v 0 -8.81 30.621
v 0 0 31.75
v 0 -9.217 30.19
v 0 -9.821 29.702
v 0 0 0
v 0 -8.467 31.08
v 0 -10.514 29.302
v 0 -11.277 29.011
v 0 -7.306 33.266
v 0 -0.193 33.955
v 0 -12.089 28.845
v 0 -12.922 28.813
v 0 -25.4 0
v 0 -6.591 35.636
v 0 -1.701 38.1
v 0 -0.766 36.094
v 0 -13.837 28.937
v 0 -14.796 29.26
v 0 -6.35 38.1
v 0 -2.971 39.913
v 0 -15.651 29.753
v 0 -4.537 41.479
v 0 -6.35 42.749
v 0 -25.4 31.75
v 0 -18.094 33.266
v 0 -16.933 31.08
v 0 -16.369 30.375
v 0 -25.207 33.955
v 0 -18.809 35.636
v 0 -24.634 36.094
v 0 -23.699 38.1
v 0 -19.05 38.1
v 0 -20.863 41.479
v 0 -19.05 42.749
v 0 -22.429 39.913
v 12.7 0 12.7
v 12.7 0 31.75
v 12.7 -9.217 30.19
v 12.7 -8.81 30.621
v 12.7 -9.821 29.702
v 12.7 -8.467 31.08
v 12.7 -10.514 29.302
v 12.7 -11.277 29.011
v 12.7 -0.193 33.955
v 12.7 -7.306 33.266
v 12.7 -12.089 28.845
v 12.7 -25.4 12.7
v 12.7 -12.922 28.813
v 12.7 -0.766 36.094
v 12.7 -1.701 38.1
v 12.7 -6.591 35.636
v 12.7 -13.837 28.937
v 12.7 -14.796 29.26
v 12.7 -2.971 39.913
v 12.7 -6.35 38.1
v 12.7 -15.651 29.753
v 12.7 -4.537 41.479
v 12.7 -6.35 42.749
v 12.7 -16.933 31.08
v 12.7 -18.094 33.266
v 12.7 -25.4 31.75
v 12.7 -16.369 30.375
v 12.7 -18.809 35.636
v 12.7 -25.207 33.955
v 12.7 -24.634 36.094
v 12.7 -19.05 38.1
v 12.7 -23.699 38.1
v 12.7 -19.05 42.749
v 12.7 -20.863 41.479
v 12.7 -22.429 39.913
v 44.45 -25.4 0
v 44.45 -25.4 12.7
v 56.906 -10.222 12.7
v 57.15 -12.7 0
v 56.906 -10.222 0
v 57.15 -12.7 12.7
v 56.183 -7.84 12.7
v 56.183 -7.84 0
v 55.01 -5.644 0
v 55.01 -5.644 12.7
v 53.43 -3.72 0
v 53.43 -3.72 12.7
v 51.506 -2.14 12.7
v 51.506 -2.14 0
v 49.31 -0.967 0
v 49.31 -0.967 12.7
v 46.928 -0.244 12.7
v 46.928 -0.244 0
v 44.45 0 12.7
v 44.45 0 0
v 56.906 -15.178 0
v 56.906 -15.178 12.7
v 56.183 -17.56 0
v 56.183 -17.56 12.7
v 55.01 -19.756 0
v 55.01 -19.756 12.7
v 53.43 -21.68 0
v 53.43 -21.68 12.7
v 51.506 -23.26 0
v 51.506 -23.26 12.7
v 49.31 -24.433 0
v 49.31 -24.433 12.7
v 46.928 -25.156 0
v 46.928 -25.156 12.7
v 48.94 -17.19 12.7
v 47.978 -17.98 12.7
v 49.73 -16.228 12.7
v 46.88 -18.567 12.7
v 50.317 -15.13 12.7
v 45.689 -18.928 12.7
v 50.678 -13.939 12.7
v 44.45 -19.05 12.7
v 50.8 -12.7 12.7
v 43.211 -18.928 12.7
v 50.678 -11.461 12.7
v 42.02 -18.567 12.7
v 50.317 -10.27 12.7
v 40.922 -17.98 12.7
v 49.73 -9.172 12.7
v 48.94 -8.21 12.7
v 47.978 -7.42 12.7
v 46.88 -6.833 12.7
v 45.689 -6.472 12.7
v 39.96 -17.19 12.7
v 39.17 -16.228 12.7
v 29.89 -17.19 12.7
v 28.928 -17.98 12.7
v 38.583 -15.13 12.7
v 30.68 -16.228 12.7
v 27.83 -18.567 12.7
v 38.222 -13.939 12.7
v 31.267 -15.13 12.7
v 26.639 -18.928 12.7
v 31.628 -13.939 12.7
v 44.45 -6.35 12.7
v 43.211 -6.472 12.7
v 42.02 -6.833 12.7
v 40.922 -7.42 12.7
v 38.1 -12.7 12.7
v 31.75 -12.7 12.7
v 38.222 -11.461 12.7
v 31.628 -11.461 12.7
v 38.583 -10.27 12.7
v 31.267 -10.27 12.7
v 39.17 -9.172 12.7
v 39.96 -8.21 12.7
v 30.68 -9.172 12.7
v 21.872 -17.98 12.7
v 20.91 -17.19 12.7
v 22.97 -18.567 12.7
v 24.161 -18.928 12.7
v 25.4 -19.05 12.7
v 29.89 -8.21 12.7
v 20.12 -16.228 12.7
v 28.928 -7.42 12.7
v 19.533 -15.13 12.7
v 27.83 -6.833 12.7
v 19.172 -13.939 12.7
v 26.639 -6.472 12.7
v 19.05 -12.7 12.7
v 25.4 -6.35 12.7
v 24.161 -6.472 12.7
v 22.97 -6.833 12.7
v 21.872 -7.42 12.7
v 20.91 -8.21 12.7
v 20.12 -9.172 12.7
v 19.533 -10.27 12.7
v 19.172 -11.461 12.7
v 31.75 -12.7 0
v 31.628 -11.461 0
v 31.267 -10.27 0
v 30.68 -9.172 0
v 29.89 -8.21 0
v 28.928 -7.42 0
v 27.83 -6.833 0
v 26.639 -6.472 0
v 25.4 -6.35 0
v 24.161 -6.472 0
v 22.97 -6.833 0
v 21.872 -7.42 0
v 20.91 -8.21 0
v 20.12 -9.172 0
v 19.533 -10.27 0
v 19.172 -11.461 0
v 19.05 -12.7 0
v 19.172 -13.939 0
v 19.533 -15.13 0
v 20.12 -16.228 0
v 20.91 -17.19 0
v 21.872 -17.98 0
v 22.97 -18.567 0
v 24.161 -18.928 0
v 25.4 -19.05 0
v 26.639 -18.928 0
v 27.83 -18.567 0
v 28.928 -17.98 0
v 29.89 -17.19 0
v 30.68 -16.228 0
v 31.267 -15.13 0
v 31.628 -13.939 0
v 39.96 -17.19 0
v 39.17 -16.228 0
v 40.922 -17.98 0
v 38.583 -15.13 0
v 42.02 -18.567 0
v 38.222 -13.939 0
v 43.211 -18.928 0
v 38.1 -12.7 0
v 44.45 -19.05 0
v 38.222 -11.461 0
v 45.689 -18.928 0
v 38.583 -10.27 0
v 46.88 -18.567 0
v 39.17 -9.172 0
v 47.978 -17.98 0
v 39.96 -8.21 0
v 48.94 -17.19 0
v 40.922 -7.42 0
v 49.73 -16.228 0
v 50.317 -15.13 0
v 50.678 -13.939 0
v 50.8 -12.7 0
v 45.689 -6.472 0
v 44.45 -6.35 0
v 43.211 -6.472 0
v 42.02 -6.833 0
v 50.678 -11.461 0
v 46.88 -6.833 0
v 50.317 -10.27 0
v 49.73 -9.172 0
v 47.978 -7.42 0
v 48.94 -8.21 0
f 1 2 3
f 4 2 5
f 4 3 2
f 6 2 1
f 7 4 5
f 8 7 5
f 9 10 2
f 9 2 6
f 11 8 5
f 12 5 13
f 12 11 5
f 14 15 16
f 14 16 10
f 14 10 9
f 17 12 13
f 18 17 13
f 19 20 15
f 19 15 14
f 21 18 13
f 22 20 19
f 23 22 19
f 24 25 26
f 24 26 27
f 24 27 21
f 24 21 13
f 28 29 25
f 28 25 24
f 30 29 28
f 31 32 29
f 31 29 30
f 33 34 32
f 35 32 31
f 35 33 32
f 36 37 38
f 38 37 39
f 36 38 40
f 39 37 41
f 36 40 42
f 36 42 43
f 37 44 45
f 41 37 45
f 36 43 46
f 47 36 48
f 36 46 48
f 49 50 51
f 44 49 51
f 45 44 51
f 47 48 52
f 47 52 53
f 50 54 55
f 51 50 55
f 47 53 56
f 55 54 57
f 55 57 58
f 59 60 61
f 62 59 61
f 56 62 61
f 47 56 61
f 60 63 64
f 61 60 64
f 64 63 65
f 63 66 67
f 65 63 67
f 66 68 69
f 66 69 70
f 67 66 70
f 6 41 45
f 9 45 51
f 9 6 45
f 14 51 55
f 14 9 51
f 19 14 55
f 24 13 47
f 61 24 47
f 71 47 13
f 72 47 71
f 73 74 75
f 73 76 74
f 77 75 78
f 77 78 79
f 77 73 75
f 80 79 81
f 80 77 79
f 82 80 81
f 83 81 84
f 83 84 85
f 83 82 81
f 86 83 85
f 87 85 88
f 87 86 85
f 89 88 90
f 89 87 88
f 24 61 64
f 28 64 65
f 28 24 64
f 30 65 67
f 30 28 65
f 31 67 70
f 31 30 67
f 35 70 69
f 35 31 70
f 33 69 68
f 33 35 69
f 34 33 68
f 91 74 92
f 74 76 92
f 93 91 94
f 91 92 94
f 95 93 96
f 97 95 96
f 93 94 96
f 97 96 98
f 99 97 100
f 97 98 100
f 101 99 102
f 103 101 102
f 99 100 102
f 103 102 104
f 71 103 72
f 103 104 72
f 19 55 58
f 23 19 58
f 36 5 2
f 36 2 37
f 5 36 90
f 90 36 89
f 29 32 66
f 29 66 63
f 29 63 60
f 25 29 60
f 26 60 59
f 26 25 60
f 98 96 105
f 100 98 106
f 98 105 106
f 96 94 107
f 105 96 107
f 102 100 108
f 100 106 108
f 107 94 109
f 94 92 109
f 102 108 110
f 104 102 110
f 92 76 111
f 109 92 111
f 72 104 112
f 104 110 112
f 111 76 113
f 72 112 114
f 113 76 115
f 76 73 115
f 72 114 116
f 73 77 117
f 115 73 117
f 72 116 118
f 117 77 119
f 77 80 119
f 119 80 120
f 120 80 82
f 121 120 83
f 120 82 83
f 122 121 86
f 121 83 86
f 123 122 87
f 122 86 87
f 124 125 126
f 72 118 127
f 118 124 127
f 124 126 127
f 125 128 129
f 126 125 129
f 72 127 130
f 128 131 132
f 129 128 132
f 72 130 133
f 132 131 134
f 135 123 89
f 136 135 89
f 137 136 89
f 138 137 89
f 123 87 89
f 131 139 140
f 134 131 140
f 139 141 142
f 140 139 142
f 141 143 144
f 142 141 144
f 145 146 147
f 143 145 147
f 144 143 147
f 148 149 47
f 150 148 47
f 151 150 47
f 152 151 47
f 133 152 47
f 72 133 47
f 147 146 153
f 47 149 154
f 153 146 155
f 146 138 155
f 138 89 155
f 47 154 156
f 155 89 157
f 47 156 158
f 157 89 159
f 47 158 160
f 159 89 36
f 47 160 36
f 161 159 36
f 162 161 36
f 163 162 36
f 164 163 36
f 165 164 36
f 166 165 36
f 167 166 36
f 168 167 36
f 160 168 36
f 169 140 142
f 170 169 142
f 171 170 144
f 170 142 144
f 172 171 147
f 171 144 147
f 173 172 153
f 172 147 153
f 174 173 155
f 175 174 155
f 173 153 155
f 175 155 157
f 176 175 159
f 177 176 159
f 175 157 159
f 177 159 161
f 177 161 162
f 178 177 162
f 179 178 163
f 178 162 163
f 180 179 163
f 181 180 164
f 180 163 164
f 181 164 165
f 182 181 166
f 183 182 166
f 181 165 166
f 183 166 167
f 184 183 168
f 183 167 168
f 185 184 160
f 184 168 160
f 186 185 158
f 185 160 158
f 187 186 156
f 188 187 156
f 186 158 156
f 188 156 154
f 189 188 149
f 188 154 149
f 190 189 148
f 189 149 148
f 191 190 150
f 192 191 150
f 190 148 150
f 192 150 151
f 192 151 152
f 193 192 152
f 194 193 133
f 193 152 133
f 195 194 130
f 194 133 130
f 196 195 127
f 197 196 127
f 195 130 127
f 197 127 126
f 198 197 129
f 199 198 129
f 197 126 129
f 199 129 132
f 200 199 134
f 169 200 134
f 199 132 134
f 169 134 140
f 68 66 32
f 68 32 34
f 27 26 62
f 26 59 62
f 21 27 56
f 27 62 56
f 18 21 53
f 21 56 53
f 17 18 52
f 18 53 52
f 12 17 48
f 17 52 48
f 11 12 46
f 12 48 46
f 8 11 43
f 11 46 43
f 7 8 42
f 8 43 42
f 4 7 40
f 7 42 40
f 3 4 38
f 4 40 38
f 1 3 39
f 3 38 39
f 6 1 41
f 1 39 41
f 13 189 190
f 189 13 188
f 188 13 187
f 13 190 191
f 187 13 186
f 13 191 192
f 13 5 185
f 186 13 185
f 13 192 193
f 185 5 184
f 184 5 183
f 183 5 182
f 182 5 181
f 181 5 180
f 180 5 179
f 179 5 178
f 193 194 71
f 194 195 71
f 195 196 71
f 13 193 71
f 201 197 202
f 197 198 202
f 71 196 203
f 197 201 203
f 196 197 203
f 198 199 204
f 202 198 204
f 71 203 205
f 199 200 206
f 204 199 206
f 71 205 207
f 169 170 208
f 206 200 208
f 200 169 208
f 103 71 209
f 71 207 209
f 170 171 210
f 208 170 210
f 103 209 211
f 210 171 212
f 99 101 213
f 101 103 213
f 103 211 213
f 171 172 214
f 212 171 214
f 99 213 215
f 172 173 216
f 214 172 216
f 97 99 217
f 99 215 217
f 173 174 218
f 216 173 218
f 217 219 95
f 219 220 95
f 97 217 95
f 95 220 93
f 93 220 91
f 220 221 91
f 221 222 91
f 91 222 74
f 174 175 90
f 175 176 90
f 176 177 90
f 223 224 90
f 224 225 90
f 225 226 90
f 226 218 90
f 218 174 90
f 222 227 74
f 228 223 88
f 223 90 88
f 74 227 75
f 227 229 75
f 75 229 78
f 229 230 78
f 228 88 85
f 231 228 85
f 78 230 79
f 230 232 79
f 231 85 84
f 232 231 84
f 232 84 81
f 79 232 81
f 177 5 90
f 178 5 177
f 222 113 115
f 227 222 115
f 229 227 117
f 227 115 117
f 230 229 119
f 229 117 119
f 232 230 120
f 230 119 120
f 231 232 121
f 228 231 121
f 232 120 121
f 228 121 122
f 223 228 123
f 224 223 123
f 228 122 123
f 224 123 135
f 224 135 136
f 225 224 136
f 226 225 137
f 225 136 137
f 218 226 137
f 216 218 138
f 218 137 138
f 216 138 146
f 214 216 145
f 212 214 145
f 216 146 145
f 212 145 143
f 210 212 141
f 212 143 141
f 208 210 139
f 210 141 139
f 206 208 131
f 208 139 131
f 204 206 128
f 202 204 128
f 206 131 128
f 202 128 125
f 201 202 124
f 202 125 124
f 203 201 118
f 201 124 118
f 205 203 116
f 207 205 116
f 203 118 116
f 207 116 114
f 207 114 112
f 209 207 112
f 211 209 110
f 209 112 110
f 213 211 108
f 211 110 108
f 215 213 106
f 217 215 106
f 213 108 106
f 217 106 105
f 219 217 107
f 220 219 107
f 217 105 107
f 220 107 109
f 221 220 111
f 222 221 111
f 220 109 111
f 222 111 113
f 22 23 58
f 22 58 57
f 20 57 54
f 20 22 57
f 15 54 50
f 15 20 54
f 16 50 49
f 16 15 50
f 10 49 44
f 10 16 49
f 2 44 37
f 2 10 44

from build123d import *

# Parameters (mm, degrees)
F1_DEPTH    = 25.4
F2_R        = 12.7
F3_R        = 12.69999
F4_R        = 12.7
F5_T1_DEPTH = 76.2
F6_W        = 12.7
F6_H        = 17.3485226281
F7_DEPTH    = 25.4
F9_T1_DEPTH = 12.7
F10_R       = 5.08
F11_R       = 6.35
F12_DEPTH   = 12.7


# Not quite as in the source:
# - a fillet or chamfer that OpenCascade refuses, or shapes differently, is made with other operations: its cross-section is extruded or revolved along the edge and cut away or added
# - a fillet or chamfer is up to 0.001 mm smaller than in the source, because OpenCascade refuses the exact size
# - a feature of the source that left no trace in its solid (it failed there, or was rolled back) is left out


with BuildPart() as f1:
    # F0 (on Front) → F1 (new body)
    with BuildSketch(Plane.XZ):
        Polygon((0, 44.45), (0, 0), (57.15, 0), (57.15, 12.7), (12.7, 12.7), (12.7, 44.45), align=None)
    extrude(amount=F1_DEPTH)

    # F2
    f2_edges = [f1.edges().sort_by_distance(p)[0] for p in [
        (57.15, -25.4, 6.35),
    ]]
    fillet(f2_edges, radius=F2_R)

    # F3 (radius 12.7 in the source; OpenCascade refuses exactly that, so slightly less here)
    f3_edges = [f1.edges().sort_by_distance(p)[0] for p in [
        (57.15, 0, 6.35),
    ]]
    fillet(f3_edges, radius=F3_R)

    # F4
    f4_edges = [f1.edges().sort_by_distance(p)[0] for p in [
        (6.35, -25.4, 44.45),
    ]]
    fillet(f4_edges, radius=F4_R)

    # F5: fillet of radius 12.7 on 1 edges, made by hand

    # F5_s2 → F5_t1 (cut)
    with BuildSketch(Plane.YZ.offset(-31.75)):
        with BuildLine():
            ThreePointArc((-12.7, 44.45), (-3.7197438789, 40.7302561211), (0, 31.75))
            Line((0, 31.75), (0, 44.45))
            Line((0, 44.45), (-12.7, 44.45))
        make_face()
    extrude(amount=F5_T1_DEPTH, mode=Mode.SUBTRACT)

    # F6 (on face) → F7 (cut)
    with BuildSketch(Plane.YZ.offset(12.7)):
        with BuildLine():
            ThreePointArc((-12.7, 44.45), (-15.9870018728, 44.0172579939), (-19.05, 42.7485226281))
            Line((-19.05, 42.7485226281), (-6.35, 42.7485226281))
            ThreePointArc((-6.35, 42.7485226281), (-9.4129981272, 44.0172579939), (-12.7, 44.45))
        make_face()
        with Locations((-12.7, 34.074261314)):
            Rectangle(F6_W, F6_H)
    extrude(amount=-F7_DEPTH, mode=Mode.SUBTRACT)

    # F9: fillet of radius 12.7 on 2 edges, made by hand

    # F9_s2 → F9_t1 (join)
    with BuildSketch(Plane.YZ):
        with BuildLine():
            ThreePointArc((-19.05, 38.1), (-15.3302561211, 29.1197438789), (-6.35, 25.4))
            Line((-6.35, 25.4), (-19.05, 25.4))
            Line((-19.05, 25.4), (-19.05, 38.1))
        make_face()
        with BuildLine():
            ThreePointArc((-19.05, 25.4), (-10.0697438789, 29.1197438789), (-6.35, 38.1))
            Line((-6.35, 38.1), (-6.35, 25.4))
            Line((-6.35, 25.4), (-19.05, 25.4))
        make_face()
    extrude(amount=F9_T1_DEPTH)

    # F10
    f10_edges = [f1.edges().sort_by_distance(p)[0] for p in [
        (6.35, -12.7, 27.101477),
    ]]
    fillet(f10_edges, radius=F10_R)

    # F11 (on face) → F12 (cut)
    with BuildSketch(Plane.XY.offset(12.7)):
        with Locations((25.4, -12.7)):
            Circle(F11_R)
        with Locations((44.45, -12.7)):
            Circle(F11_R)
    extrude(amount=-F12_DEPTH, mode=Mode.SUBTRACT)


solid = f1.part
